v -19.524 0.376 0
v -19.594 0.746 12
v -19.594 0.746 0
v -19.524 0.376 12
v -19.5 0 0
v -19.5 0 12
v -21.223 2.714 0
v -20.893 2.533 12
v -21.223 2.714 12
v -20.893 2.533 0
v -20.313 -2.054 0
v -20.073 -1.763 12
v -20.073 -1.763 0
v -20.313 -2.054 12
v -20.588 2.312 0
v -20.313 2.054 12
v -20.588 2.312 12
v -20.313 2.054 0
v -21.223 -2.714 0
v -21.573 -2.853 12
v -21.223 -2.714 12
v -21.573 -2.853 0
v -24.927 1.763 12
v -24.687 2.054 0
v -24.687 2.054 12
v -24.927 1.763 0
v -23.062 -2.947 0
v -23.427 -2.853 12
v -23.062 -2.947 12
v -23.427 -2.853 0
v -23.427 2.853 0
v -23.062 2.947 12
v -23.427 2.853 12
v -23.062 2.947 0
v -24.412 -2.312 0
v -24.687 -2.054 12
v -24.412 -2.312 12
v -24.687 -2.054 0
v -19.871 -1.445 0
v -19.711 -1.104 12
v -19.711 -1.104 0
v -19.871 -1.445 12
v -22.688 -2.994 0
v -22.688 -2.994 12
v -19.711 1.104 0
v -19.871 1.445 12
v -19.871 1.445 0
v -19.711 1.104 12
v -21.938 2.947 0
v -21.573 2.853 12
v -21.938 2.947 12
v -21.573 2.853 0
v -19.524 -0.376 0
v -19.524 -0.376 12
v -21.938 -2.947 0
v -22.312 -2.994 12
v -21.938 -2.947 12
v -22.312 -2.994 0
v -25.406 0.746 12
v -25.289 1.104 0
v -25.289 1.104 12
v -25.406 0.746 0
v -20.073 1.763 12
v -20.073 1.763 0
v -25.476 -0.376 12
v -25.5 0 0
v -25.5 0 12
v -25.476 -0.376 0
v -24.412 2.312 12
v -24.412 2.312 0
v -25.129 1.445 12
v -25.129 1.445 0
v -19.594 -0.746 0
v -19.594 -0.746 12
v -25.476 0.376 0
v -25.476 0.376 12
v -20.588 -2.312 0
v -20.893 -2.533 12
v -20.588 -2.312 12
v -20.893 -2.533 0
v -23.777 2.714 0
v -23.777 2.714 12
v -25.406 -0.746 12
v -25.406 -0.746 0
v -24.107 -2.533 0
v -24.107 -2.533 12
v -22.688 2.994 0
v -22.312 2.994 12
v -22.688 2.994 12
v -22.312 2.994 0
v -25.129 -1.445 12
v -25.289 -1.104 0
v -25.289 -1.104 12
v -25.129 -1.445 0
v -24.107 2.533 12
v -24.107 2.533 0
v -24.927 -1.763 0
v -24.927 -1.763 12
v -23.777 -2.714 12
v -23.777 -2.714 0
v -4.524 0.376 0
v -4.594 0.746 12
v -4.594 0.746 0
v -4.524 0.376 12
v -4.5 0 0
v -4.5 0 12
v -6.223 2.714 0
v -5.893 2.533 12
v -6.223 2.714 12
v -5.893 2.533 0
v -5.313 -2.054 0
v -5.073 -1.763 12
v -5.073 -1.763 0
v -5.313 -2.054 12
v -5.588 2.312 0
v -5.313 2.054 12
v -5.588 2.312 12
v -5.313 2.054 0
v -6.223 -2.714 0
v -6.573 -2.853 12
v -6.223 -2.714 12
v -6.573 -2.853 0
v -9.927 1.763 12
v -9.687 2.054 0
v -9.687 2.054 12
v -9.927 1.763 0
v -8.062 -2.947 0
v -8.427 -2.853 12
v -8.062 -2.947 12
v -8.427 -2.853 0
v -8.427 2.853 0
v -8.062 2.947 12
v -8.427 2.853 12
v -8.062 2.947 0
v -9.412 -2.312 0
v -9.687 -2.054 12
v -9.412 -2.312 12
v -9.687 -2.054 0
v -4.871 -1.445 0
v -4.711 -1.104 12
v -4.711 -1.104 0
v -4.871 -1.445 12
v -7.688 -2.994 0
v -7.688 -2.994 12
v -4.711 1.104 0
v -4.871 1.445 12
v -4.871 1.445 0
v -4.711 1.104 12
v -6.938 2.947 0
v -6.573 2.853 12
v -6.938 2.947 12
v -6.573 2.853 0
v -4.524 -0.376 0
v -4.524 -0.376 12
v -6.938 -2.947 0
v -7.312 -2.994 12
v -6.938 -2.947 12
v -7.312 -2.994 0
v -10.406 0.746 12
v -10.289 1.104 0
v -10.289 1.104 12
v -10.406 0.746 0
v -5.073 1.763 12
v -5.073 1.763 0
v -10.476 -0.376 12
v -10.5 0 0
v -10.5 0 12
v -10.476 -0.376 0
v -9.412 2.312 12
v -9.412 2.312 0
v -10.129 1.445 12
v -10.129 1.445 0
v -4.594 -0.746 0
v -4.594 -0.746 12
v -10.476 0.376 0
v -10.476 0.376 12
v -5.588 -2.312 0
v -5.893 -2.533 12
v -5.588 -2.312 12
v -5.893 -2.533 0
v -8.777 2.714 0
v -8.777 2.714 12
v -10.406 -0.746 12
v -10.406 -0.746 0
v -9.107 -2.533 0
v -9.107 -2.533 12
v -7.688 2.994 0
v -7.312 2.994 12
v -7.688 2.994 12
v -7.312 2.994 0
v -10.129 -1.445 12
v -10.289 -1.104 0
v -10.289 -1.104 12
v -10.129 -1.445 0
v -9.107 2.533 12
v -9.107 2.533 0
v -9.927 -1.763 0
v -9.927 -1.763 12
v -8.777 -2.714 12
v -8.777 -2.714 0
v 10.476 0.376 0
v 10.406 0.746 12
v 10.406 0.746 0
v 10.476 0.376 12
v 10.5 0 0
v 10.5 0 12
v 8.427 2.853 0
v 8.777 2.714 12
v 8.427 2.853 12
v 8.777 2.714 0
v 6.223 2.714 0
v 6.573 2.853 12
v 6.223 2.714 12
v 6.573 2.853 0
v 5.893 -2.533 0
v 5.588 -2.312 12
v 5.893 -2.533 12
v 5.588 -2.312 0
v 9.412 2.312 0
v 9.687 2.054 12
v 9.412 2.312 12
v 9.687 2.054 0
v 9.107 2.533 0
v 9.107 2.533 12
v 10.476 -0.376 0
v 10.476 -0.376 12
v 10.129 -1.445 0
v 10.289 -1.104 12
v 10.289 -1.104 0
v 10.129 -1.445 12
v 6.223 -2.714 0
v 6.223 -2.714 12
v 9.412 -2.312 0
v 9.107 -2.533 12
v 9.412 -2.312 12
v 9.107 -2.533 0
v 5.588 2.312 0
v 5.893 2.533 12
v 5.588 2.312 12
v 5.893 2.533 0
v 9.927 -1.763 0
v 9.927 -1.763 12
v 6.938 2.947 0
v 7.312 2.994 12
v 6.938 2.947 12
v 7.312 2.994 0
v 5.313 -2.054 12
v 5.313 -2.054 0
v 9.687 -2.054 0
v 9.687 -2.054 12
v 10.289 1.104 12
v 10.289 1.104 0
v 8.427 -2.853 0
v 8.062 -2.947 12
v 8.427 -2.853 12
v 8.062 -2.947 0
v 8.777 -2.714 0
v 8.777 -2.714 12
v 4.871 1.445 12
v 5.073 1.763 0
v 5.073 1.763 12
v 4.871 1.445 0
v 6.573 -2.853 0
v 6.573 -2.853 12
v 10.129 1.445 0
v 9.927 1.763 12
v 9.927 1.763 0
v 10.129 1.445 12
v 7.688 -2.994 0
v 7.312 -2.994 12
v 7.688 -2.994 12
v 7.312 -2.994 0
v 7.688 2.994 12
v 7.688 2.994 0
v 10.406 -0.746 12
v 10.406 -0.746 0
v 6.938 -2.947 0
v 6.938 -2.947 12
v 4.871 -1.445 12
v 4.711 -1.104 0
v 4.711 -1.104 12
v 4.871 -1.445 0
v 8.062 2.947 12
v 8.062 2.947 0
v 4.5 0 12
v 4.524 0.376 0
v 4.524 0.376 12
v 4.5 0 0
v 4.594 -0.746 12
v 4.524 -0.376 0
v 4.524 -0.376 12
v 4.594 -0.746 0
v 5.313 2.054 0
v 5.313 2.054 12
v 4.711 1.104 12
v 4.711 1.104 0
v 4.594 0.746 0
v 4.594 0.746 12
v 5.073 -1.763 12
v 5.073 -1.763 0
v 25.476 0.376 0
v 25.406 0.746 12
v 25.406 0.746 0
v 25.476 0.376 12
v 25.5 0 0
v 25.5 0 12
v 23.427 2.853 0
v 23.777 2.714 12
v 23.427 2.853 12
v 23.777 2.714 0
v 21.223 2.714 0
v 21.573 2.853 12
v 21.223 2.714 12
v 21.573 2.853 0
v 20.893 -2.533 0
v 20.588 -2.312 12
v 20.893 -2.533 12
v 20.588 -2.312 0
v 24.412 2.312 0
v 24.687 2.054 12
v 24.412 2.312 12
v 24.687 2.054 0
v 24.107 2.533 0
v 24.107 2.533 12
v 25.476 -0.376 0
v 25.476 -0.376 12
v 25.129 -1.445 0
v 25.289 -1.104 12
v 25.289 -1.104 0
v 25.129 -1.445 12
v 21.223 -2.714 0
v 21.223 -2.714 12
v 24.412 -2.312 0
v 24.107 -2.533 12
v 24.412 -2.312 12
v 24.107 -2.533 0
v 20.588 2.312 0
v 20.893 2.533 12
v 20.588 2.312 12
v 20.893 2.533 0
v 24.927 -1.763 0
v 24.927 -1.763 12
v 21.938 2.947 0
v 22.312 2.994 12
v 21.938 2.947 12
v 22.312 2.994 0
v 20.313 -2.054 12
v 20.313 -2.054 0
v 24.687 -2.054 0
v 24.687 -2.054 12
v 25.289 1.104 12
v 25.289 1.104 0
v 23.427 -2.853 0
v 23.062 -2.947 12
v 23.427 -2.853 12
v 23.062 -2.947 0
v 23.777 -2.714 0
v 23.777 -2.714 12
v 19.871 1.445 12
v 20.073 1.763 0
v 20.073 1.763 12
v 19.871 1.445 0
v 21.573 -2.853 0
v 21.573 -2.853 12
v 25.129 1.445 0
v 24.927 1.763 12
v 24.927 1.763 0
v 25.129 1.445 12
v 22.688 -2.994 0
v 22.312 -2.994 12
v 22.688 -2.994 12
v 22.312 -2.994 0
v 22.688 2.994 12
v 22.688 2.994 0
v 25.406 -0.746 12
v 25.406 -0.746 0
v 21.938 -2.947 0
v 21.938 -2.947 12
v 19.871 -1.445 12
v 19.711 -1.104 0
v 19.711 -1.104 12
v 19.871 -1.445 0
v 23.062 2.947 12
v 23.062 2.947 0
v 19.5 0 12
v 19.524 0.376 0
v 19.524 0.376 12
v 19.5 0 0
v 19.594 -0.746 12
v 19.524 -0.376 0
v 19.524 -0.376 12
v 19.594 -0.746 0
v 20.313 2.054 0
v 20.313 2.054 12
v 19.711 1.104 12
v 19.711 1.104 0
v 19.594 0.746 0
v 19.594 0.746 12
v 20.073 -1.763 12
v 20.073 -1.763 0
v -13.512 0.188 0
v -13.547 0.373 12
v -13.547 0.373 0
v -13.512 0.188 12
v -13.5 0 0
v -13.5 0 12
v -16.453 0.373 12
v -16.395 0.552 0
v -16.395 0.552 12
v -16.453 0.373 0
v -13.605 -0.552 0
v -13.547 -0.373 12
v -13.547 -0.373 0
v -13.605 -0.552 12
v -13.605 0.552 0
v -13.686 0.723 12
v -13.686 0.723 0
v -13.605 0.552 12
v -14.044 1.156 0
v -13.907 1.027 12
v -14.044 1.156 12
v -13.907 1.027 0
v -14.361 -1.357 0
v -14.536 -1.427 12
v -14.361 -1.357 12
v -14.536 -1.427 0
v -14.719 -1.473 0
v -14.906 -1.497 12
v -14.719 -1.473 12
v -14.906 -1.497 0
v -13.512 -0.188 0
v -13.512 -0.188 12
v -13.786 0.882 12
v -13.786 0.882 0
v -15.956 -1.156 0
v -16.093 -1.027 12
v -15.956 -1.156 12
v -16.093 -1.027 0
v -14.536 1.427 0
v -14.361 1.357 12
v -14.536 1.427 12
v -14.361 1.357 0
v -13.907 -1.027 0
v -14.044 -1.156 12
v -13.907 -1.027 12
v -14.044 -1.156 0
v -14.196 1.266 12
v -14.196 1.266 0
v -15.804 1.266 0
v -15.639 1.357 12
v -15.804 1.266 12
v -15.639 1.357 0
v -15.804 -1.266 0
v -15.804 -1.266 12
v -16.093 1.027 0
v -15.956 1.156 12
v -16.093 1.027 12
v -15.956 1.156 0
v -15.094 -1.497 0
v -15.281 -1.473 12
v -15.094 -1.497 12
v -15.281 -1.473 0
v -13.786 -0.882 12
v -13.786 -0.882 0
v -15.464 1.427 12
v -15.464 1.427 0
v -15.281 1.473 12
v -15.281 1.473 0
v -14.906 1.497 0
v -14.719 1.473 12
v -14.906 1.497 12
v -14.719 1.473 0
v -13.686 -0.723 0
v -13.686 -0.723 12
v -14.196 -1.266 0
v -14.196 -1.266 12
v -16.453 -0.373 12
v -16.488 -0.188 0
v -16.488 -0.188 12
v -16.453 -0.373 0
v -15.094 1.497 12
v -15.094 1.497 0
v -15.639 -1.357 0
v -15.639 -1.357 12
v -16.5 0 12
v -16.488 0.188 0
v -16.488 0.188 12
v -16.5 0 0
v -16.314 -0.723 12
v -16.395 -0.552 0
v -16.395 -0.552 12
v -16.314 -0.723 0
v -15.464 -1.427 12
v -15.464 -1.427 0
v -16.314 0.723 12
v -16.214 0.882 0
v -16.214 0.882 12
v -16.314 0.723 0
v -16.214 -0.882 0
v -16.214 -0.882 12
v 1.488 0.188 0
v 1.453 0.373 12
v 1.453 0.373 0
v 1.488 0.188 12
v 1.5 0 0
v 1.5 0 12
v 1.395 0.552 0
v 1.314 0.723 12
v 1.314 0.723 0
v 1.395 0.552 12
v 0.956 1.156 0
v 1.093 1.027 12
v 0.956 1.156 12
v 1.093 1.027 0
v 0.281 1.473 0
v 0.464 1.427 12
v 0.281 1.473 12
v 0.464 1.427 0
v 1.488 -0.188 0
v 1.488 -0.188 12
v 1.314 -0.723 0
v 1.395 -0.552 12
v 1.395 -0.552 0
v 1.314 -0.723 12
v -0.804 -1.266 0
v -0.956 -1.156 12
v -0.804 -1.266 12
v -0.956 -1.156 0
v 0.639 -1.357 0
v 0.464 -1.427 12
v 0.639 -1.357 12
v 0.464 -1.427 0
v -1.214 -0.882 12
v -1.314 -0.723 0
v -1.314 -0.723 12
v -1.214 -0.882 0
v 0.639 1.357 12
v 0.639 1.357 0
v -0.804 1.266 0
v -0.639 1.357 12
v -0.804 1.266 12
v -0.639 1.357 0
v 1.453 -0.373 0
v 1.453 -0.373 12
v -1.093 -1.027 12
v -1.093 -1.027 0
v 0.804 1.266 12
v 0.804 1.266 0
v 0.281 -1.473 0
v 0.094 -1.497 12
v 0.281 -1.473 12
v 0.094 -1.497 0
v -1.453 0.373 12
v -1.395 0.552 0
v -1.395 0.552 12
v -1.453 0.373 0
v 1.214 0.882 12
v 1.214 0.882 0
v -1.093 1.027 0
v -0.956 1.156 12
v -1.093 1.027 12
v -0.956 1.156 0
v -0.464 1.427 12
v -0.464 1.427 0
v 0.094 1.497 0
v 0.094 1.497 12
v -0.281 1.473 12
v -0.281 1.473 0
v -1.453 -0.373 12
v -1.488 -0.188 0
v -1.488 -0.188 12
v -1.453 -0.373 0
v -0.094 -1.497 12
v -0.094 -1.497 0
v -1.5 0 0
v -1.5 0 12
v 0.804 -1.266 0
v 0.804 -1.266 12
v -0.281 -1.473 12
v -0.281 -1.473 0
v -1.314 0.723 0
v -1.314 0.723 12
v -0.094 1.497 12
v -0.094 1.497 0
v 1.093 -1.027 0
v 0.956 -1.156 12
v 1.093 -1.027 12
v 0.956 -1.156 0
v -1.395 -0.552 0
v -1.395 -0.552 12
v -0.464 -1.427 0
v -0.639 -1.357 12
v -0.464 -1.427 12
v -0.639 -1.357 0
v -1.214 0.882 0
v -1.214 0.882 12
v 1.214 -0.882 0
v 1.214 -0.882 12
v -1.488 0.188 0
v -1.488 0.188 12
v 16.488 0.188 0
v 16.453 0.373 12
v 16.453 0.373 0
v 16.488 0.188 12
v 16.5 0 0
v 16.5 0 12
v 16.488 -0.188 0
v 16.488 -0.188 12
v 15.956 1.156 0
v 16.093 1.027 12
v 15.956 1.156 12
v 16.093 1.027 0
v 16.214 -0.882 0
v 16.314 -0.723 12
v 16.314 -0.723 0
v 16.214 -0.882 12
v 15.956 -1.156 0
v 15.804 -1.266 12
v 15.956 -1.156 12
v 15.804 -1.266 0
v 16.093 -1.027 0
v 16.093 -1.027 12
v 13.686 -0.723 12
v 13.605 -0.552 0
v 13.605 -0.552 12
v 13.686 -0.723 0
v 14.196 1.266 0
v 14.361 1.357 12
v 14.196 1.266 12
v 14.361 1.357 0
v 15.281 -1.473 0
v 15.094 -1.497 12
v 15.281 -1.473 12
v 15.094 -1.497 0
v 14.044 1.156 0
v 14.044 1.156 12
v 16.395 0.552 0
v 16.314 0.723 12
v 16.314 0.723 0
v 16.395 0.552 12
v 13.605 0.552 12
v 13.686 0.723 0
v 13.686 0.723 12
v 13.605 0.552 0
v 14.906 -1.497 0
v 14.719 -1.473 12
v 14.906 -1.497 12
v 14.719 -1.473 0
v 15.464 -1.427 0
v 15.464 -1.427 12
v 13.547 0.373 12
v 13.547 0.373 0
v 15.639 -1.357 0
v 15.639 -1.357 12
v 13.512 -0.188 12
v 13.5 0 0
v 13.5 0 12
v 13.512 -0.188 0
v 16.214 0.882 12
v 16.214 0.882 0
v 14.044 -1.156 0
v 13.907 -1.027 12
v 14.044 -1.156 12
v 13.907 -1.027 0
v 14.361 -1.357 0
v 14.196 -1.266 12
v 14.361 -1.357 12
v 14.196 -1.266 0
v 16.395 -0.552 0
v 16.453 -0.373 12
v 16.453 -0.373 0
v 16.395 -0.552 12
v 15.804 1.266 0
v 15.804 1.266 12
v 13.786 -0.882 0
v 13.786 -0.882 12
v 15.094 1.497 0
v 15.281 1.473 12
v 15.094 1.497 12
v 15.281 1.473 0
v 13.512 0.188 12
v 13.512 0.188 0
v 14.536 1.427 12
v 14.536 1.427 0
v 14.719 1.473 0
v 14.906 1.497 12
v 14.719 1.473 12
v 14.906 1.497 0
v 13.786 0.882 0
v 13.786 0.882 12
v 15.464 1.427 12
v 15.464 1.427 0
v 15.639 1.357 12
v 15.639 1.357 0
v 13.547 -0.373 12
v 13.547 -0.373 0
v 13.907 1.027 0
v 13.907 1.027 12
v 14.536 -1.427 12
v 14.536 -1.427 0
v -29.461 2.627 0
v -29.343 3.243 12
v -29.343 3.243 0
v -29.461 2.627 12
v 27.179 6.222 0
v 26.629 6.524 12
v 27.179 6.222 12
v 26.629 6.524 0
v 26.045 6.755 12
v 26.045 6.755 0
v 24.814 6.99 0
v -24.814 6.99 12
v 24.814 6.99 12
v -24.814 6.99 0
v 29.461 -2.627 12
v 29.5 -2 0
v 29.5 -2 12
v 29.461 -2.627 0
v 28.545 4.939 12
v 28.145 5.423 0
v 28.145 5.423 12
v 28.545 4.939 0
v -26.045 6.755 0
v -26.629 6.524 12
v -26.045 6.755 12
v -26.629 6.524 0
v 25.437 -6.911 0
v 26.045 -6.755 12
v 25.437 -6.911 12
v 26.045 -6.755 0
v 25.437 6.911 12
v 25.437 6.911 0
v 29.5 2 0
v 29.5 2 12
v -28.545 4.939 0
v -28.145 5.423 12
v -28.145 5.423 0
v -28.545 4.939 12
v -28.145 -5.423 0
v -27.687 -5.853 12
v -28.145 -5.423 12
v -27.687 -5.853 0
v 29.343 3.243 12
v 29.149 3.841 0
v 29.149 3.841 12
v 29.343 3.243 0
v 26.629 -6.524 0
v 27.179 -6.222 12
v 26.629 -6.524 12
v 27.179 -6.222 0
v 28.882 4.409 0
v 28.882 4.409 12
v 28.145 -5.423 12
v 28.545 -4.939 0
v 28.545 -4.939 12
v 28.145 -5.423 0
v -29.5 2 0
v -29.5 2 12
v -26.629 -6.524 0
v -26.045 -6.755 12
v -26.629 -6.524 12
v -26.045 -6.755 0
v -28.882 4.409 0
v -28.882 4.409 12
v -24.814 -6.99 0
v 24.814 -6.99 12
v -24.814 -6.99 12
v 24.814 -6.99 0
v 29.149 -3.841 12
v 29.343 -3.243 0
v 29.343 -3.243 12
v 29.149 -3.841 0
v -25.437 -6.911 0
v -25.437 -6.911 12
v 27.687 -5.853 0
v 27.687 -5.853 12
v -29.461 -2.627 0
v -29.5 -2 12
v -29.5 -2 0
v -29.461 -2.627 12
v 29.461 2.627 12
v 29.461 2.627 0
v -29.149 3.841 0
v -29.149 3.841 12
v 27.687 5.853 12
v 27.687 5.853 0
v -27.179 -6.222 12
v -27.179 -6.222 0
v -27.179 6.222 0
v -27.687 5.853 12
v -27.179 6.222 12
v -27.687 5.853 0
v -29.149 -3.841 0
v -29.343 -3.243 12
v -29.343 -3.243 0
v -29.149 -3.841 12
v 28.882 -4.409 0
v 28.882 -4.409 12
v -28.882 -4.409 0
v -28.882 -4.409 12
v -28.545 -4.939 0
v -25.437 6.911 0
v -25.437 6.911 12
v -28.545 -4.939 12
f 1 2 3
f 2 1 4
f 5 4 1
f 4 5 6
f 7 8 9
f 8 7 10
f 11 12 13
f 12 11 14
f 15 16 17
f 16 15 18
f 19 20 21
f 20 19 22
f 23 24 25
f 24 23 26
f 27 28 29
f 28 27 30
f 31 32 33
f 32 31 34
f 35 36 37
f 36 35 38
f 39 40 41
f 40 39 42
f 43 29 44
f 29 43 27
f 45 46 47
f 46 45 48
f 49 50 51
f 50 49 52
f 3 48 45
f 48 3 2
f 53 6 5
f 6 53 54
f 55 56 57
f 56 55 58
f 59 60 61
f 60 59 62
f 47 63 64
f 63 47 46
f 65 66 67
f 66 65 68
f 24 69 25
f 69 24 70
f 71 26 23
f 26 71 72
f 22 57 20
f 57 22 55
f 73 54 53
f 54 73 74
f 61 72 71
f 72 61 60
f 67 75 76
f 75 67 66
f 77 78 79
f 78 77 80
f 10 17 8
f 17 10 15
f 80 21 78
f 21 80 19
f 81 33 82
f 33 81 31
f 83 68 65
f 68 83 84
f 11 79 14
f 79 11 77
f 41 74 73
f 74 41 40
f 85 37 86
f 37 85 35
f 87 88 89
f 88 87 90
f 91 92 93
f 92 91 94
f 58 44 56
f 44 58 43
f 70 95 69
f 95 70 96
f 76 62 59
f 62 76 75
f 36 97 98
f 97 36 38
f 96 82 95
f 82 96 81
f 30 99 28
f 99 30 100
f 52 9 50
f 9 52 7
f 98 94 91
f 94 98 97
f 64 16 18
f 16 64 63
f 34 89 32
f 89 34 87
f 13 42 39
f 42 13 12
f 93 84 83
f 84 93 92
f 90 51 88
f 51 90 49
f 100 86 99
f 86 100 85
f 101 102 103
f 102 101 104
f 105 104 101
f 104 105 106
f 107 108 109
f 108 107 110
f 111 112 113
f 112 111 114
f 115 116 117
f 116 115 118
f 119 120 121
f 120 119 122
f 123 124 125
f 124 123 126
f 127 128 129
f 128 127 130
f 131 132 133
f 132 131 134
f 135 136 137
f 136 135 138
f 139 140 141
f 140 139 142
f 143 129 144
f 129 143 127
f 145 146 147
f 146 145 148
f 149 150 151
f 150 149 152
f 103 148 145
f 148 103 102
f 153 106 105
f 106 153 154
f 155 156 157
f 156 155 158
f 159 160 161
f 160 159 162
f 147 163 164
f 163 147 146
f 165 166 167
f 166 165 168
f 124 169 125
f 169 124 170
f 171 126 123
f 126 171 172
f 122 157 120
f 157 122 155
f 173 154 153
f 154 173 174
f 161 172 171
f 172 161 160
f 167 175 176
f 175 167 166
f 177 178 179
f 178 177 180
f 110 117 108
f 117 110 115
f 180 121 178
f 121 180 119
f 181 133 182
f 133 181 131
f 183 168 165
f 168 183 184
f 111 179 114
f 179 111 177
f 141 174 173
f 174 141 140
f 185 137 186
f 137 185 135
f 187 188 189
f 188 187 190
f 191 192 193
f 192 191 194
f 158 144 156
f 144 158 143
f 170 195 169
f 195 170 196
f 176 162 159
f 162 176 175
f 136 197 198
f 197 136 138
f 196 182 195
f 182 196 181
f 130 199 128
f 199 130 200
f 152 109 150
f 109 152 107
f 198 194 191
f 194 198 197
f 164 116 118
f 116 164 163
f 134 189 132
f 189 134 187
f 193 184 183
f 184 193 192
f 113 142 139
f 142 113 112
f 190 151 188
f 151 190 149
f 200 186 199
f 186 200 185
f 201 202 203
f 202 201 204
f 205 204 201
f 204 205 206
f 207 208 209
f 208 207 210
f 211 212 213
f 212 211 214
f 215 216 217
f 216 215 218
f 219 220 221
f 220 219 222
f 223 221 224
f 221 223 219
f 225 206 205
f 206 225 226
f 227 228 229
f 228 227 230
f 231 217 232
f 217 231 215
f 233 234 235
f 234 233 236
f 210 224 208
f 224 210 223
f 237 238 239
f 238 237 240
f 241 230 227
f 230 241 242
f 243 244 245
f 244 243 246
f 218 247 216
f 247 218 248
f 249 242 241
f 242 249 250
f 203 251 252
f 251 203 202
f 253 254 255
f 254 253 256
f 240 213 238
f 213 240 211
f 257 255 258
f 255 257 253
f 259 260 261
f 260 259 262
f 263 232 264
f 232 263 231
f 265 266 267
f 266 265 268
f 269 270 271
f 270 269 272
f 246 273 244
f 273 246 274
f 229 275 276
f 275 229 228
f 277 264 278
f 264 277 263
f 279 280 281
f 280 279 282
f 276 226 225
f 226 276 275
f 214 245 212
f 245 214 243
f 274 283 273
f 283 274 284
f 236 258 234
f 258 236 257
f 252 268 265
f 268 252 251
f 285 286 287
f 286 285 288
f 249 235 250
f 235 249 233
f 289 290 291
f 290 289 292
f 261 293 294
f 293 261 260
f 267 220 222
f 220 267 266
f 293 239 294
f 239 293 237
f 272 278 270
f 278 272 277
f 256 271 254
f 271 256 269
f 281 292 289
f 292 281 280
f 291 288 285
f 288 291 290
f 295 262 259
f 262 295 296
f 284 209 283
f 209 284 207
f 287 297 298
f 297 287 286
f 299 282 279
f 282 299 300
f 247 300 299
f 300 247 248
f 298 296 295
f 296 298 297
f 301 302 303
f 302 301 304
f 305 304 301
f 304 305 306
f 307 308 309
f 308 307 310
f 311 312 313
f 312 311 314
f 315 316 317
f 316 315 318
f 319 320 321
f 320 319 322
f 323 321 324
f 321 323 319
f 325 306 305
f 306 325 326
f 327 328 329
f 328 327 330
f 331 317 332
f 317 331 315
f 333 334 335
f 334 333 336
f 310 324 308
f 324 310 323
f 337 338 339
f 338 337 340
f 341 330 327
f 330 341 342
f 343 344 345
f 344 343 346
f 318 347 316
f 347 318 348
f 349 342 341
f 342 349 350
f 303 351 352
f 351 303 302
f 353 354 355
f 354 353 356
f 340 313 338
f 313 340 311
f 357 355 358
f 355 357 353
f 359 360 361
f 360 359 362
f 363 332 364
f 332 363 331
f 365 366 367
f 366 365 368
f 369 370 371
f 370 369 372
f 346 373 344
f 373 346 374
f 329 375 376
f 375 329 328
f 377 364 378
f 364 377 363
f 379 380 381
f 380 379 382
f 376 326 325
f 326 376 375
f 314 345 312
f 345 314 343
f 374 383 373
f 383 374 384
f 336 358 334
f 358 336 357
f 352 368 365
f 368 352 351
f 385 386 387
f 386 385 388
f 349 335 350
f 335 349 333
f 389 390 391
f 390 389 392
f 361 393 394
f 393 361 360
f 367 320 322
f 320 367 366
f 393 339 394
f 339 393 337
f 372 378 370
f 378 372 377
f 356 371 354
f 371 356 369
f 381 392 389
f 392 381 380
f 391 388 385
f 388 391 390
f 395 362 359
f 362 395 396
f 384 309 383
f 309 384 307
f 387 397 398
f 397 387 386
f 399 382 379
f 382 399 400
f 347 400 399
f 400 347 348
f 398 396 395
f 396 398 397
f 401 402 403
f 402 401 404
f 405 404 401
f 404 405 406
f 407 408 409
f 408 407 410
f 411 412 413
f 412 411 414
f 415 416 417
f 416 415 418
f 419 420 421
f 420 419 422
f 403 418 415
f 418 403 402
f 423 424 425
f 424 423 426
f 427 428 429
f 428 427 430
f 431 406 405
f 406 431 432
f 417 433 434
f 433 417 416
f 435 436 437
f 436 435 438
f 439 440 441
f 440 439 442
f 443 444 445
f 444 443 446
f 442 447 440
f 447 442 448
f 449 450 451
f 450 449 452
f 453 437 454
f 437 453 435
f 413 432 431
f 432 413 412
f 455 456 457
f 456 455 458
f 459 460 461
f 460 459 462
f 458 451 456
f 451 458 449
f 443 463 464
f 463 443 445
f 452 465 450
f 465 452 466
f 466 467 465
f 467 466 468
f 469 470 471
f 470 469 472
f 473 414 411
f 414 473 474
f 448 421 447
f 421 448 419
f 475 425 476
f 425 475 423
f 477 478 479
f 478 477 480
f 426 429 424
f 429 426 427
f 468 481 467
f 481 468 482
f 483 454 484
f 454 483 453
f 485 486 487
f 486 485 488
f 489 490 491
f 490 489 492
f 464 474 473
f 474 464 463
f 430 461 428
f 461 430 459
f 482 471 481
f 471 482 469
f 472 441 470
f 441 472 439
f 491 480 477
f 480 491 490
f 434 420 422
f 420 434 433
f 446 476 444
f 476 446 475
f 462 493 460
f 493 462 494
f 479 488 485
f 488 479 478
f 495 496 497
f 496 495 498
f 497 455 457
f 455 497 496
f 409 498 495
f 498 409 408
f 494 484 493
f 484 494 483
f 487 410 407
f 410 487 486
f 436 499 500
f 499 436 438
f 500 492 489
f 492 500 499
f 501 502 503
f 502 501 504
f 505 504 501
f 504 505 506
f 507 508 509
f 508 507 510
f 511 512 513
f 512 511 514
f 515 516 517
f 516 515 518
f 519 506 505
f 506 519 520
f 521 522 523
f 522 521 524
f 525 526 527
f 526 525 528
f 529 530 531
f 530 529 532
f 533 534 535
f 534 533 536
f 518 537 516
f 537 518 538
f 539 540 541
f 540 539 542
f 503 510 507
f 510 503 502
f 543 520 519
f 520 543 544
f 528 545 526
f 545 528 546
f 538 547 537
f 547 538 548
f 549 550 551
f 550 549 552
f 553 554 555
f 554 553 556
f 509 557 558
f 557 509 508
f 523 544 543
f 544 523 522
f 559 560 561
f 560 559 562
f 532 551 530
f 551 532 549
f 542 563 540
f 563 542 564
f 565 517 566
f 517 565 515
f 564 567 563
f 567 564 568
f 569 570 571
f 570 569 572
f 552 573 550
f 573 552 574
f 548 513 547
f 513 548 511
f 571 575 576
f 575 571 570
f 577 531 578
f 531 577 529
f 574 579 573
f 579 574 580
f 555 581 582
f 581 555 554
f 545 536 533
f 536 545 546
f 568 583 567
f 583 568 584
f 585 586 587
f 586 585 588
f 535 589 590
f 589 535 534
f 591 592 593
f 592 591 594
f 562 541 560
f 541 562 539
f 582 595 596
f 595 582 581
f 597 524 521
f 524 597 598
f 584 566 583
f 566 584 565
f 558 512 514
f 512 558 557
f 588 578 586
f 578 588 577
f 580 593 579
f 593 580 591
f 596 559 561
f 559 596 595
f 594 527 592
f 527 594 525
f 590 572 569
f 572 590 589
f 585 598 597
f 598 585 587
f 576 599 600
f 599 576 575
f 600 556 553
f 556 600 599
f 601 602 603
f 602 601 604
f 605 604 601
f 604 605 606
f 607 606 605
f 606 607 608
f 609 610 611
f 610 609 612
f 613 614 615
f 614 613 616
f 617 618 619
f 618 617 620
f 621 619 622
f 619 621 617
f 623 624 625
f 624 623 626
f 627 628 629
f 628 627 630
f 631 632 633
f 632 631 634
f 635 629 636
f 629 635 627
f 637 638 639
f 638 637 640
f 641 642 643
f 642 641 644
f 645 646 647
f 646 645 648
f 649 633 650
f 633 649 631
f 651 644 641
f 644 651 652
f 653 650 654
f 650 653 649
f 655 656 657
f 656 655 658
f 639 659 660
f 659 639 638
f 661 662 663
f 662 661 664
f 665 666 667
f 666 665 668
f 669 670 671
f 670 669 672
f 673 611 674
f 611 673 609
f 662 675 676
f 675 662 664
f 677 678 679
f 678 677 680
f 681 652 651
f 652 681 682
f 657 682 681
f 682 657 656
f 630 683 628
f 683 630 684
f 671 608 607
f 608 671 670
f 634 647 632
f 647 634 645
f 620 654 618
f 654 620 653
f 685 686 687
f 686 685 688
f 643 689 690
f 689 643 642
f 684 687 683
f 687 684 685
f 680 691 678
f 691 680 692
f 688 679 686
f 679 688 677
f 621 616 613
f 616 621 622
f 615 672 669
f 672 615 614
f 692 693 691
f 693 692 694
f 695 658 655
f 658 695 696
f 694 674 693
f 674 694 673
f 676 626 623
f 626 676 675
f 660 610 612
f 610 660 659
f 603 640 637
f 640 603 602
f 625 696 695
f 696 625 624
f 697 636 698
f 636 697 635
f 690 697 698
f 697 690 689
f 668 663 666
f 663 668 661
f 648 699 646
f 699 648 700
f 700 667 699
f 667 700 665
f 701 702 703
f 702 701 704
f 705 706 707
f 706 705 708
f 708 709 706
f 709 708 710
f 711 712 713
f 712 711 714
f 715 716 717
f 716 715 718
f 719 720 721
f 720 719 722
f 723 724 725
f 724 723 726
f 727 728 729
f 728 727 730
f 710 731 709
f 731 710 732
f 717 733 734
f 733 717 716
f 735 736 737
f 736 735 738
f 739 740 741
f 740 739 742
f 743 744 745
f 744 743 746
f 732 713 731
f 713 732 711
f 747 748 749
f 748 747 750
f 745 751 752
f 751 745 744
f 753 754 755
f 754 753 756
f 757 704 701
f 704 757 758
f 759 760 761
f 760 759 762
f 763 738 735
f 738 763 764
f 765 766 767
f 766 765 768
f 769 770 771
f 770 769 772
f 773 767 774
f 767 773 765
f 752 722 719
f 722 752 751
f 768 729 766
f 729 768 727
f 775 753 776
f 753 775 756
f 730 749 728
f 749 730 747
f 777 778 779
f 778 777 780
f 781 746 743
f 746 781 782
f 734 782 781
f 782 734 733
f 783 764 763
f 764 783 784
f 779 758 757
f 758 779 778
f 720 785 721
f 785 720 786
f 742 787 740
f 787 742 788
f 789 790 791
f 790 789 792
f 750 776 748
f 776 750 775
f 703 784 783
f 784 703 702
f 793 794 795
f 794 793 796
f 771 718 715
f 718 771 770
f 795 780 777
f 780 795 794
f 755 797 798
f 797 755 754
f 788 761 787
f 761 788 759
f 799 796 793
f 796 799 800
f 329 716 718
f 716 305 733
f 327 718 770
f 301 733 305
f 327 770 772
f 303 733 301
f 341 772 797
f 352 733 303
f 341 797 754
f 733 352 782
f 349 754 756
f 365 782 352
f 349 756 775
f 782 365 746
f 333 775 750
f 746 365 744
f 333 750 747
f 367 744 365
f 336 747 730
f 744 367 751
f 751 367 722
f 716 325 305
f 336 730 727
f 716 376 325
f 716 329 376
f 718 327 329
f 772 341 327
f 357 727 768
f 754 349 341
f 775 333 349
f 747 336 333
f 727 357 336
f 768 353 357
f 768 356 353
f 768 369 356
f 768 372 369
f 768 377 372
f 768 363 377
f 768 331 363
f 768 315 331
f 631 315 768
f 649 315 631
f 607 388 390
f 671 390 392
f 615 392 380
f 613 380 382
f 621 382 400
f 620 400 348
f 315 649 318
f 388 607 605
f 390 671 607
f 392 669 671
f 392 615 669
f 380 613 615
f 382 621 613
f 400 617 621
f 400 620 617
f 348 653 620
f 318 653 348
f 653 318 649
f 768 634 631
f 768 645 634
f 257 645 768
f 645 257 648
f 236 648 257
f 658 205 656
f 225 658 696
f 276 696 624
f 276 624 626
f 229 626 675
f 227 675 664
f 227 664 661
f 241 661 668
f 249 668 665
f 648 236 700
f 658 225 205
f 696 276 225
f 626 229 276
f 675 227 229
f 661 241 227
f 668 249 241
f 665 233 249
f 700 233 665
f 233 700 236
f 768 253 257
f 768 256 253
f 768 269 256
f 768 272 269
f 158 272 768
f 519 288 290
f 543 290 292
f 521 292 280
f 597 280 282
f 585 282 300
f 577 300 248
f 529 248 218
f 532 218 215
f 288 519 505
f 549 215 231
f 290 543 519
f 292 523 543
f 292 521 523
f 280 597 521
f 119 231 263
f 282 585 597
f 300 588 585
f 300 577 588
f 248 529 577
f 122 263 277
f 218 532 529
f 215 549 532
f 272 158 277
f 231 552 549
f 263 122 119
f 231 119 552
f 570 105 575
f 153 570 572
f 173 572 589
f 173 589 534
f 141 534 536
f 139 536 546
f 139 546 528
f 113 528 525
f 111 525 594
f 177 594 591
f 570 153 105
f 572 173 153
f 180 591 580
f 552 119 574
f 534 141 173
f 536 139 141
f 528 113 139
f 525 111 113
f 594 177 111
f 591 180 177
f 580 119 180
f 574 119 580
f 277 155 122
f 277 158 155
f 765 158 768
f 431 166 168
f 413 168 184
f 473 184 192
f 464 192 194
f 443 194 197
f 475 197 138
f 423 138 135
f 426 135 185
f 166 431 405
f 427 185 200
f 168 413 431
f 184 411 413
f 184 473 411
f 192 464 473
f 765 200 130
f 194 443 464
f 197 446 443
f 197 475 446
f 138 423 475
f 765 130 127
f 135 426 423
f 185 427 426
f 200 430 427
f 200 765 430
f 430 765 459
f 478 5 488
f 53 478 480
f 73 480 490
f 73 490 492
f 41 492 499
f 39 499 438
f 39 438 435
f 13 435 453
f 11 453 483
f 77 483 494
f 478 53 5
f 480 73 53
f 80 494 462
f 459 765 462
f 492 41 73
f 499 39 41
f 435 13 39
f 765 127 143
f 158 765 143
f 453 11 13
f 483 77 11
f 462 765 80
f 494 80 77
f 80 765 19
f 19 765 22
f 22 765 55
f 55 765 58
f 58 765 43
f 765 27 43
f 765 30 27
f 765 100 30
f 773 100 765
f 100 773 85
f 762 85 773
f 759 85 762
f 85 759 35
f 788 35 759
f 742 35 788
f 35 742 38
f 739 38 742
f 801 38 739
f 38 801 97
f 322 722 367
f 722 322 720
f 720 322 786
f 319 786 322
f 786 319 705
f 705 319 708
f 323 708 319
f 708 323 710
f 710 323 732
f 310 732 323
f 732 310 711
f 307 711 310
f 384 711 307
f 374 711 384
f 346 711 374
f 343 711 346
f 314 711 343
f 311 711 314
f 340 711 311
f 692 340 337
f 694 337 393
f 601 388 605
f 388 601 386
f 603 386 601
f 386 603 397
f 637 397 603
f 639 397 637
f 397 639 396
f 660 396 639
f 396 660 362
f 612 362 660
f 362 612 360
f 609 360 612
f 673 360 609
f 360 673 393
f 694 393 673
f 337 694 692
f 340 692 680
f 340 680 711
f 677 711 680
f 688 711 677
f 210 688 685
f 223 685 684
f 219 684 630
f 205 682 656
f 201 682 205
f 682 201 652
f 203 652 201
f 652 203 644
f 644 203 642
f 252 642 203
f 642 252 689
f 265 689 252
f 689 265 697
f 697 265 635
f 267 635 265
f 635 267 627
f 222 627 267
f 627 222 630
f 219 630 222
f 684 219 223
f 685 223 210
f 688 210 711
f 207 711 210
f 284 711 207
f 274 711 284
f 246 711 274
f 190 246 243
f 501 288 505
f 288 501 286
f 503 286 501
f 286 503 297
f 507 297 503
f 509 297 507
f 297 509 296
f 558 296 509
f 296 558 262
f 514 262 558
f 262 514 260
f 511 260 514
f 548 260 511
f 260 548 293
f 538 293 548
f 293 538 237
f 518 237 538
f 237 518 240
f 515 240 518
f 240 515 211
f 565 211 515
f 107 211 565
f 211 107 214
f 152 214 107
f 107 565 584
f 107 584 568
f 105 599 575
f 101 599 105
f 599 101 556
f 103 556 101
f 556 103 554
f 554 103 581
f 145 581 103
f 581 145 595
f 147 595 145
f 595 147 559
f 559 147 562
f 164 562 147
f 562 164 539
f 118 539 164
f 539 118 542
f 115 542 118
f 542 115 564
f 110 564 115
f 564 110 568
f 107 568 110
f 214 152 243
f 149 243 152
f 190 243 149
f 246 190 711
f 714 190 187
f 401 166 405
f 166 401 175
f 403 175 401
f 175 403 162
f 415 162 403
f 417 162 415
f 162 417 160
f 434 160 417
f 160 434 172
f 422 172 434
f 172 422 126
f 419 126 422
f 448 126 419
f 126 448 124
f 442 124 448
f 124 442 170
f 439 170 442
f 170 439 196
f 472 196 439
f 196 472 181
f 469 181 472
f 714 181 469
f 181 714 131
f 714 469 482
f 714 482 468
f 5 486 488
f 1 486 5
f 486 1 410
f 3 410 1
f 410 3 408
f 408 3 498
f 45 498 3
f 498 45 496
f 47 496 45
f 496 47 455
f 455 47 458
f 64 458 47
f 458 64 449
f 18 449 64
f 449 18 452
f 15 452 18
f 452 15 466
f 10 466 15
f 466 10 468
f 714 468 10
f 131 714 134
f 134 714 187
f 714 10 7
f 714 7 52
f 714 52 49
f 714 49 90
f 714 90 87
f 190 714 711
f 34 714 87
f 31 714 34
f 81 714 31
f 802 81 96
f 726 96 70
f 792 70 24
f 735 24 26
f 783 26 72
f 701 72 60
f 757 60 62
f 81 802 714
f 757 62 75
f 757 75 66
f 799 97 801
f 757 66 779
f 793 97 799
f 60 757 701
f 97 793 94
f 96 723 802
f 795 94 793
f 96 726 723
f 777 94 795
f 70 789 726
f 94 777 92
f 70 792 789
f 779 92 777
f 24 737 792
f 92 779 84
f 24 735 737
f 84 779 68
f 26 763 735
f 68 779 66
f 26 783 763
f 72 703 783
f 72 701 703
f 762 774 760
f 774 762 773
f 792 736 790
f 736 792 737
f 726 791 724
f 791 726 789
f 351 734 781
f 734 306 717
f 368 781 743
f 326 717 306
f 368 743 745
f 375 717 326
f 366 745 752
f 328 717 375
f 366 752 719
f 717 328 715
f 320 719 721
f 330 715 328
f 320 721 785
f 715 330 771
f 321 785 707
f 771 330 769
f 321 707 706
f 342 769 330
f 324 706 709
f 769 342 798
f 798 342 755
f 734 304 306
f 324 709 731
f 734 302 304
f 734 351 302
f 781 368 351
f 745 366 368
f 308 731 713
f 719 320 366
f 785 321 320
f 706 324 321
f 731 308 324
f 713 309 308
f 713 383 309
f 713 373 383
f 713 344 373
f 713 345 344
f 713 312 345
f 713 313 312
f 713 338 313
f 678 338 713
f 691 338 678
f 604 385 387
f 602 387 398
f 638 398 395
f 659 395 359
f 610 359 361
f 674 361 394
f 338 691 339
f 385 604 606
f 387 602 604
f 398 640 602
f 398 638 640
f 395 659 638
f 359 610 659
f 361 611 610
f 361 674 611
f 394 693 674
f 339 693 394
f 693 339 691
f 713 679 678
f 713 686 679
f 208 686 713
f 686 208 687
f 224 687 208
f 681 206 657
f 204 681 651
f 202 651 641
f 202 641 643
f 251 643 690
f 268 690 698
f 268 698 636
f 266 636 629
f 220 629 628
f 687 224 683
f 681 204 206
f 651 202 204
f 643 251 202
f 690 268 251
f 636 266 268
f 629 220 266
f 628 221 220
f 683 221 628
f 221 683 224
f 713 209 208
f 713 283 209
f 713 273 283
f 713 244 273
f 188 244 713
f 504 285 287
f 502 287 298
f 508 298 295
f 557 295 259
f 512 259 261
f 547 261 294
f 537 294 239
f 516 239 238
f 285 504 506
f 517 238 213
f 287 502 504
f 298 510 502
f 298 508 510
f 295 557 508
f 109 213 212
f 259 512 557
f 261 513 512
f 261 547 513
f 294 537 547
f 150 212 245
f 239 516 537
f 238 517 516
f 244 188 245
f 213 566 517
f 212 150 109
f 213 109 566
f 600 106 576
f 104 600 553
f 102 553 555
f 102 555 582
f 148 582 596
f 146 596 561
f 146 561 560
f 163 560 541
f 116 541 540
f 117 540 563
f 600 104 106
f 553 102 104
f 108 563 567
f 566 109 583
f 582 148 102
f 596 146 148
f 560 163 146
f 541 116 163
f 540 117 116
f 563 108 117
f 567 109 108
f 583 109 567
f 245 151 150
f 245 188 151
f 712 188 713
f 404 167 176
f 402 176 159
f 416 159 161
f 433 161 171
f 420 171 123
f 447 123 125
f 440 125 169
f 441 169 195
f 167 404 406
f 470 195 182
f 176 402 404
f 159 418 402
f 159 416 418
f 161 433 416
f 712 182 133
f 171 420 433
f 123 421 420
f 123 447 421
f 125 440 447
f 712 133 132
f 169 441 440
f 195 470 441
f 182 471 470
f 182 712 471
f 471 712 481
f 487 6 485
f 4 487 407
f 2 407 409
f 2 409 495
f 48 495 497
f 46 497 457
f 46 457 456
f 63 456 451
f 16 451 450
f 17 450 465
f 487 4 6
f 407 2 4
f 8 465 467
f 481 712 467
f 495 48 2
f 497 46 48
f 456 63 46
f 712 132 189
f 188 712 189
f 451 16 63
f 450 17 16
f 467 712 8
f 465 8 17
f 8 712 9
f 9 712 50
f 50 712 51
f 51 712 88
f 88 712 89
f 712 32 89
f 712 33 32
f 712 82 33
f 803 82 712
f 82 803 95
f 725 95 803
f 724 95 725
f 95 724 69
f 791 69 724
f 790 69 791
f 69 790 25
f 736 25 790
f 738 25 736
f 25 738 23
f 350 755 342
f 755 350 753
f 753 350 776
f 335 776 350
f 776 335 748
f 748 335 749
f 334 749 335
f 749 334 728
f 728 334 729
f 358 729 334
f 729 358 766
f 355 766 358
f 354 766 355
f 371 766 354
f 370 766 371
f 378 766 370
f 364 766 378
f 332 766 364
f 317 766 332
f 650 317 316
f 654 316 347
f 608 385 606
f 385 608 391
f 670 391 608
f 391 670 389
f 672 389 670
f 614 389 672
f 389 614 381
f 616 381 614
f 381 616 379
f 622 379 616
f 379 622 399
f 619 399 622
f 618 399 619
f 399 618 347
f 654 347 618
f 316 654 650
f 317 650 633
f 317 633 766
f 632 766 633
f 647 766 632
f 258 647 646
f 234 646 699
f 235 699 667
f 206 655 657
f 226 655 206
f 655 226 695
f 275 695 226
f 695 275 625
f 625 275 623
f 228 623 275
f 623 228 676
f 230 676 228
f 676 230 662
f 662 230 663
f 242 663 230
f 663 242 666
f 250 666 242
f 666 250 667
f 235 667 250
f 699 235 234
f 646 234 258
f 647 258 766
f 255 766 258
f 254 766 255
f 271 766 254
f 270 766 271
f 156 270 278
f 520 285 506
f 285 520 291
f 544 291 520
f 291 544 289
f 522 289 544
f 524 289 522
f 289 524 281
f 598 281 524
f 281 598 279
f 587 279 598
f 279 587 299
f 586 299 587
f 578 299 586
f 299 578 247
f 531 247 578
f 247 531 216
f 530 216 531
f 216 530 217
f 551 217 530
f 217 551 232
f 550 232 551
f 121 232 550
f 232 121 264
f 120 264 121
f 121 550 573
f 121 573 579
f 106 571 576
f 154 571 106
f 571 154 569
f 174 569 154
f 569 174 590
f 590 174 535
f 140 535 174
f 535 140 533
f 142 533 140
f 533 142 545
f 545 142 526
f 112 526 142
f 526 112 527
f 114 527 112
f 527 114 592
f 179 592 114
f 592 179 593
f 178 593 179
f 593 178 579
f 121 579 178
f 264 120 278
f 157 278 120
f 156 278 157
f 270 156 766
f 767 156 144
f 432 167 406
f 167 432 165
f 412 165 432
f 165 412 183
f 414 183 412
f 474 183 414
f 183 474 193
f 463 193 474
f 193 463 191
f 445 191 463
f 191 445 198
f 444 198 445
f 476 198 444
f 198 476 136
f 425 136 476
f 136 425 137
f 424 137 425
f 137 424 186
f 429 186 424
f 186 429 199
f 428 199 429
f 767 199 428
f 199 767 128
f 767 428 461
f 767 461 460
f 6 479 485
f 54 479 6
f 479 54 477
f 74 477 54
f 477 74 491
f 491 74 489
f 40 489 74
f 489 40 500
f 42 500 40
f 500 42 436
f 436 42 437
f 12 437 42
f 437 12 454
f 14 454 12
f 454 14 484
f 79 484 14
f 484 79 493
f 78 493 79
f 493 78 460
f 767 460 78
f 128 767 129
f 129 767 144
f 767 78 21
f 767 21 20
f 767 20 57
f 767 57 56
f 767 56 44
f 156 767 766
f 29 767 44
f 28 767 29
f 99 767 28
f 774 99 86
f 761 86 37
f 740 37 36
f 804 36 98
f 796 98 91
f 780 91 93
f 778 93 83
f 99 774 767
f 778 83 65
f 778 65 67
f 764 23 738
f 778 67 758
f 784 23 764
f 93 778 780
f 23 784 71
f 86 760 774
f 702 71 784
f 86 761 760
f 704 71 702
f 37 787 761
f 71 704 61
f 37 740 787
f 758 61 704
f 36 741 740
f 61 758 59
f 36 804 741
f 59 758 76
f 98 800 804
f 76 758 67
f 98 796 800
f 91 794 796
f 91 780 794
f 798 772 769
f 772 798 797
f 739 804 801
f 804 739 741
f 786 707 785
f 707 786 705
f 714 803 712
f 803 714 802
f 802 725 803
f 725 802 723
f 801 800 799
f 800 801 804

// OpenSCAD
$fn = 50;


difference() {
	union() {
		*color(alpha = 1.0000000000, c = "gray") {
			translate(v = [0, 7, 0]) {
				linear_extrude(height = 1) {
					text(font = "Arial:style=Bold", halign = "center", size = 4.5000000000, text = "COMMENT plate main", valign = "center");
				}
			}
		}
		hull() {
			translate(v = [-24.5000000000, 2.0000000000, 0]) {
				cylinder(h = 12, r = 5);
			}
			translate(v = [24.5000000000, 2.0000000000, 0]) {
				cylinder(h = 12, r = 5);
			}
			translate(v = [-24.5000000000, -2.0000000000, 0]) {
				cylinder(h = 12, r = 5);
			}
			translate(v = [24.5000000000, -2.0000000000, 0]) {
				cylinder(h = 12, r = 5);
			}
		}
	}
	union() {
		*color(alpha = 1.0000000000, c = "gray") {
			translate(v = [0, 7, 0]) {
				linear_extrude(height = 1) {
					text(font = "Arial:style=Bold", halign = "center", size = 4.5000000000, text = "COMMENT holes main", valign = "center");
				}
			}
		}
		translate(v = [-22.5000000000, 0.0000000000, 0]) {
			translate(v = [0, 0, -100]) {
				cylinder(h = 200, r = 3.0000000000);
			}
		}
		translate(v = [-7.5000000000, 0.0000000000, 0]) {
			translate(v = [0, 0, -100]) {
				cylinder(h = 200, r = 3.0000000000);
			}
		}
		translate(v = [7.5000000000, 0.0000000000, 0]) {
			translate(v = [0, 0, -100]) {
				cylinder(h = 200, r = 3.0000000000);
			}
		}
		translate(v = [22.5000000000, 0.0000000000, 0]) {
			translate(v = [0, 0, -100]) {
				cylinder(h = 200, r = 3.0000000000);
			}
		}
		translate(v = [-22.5000000000, 0.0000000000, 0]) {
			translate(v = [0, 0, -100]) {
				cylinder(h = 200, r = 1.5000000000);
			}
		}
		translate(v = [-15.0000000000, 0.0000000000, 0]) {
			translate(v = [0, 0, -100]) {
				cylinder(h = 200, r = 1.5000000000);
			}
		}
		translate(v = [-7.5000000000, 0.0000000000, 0]) {
			translate(v = [0, 0, -100]) {
				cylinder(h = 200, r = 1.5000000000);
			}
		}
		translate(v = [0, 0, -100]) {
			cylinder(h = 200, r = 1.5000000000);
		}
		translate(v = [7.5000000000, 0.0000000000, 0]) {
			translate(v = [0, 0, -100]) {
				cylinder(h = 200, r = 1.5000000000);
			}
		}
		translate(v = [15.0000000000, 0.0000000000, 0]) {
			translate(v = [0, 0, -100]) {
				cylinder(h = 200, r = 1.5000000000);
			}
		}
		translate(v = [22.5000000000, 0.0000000000, 0]) {
			translate(v = [0, 0, -100]) {
				cylinder(h = 200, r = 1.5000000000);
			}
		}
	}
}
